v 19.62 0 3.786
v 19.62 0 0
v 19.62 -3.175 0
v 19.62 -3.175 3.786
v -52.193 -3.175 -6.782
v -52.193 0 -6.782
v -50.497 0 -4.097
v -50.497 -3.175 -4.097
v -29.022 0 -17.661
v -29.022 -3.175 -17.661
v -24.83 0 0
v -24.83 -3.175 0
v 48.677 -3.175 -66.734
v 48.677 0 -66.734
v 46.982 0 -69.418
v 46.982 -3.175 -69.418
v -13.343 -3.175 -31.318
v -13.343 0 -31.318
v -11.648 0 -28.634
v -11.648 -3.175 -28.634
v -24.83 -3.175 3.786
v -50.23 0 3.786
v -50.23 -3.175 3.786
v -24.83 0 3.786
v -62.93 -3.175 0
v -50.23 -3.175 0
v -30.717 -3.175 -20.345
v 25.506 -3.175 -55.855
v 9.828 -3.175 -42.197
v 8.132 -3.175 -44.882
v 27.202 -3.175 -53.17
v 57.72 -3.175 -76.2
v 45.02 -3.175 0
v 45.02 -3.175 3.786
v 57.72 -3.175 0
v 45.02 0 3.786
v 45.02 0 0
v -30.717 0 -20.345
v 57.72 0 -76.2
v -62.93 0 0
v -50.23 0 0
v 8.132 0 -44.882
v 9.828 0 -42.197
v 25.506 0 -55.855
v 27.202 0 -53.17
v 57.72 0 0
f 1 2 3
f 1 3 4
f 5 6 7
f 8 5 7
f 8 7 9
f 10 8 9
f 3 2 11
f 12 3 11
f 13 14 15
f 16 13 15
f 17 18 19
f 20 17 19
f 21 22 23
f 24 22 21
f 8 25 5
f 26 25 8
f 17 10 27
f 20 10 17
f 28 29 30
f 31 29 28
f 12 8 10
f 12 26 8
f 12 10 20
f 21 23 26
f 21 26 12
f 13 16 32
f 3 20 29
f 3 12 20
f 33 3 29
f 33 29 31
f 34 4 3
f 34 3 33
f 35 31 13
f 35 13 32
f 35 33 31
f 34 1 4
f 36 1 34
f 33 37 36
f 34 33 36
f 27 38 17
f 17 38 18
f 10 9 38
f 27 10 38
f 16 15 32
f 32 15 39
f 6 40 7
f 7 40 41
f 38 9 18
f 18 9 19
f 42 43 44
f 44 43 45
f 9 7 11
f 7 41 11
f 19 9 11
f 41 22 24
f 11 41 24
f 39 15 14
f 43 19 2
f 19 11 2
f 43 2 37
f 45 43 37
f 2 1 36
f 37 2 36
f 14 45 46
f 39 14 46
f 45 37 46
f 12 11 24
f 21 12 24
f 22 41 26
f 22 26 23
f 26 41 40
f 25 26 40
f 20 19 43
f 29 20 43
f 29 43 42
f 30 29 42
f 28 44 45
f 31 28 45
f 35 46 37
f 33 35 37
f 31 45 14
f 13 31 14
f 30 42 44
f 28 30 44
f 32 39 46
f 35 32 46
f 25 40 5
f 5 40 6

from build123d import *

# Parameters (mm, degrees)
F0_W     = 25.4
F0_H     = 3.785962
F1_DEPTH = 3.175


with BuildPart() as f1:
    # F0 (on Front) → F1 (new body)
    with BuildSketch(Plane.XZ):
        with Locations((32.3196, 1.892981)):
            Rectangle(F0_W, F0_H)
        Polygon((-50.2304, 0), (-62.9304, 0), (-52.192691, -6.781711), (-50.497263, -4.097284), (-29.021845, -17.660706), (-30.717273, -20.345133), (-13.343109, -31.318289), (-11.647681, -28.633862), (-0.909972, -35.415573), (9.827737, -42.197284), (8.132309, -44.881711), (25.506473, -55.854867), (27.201901, -53.17044), (48.677319, -66.733862), (46.981891, -69.418289), (57.7196, -76.2), (57.7196, 0), (45.0196, 0), (19.6196, 0), (-24.8304, 0), align=None)
        with Locations((-37.5304, 1.892981)):
            Rectangle(F0_W, F0_H)
    extrude(amount=F1_DEPTH)


solid = f1.part
